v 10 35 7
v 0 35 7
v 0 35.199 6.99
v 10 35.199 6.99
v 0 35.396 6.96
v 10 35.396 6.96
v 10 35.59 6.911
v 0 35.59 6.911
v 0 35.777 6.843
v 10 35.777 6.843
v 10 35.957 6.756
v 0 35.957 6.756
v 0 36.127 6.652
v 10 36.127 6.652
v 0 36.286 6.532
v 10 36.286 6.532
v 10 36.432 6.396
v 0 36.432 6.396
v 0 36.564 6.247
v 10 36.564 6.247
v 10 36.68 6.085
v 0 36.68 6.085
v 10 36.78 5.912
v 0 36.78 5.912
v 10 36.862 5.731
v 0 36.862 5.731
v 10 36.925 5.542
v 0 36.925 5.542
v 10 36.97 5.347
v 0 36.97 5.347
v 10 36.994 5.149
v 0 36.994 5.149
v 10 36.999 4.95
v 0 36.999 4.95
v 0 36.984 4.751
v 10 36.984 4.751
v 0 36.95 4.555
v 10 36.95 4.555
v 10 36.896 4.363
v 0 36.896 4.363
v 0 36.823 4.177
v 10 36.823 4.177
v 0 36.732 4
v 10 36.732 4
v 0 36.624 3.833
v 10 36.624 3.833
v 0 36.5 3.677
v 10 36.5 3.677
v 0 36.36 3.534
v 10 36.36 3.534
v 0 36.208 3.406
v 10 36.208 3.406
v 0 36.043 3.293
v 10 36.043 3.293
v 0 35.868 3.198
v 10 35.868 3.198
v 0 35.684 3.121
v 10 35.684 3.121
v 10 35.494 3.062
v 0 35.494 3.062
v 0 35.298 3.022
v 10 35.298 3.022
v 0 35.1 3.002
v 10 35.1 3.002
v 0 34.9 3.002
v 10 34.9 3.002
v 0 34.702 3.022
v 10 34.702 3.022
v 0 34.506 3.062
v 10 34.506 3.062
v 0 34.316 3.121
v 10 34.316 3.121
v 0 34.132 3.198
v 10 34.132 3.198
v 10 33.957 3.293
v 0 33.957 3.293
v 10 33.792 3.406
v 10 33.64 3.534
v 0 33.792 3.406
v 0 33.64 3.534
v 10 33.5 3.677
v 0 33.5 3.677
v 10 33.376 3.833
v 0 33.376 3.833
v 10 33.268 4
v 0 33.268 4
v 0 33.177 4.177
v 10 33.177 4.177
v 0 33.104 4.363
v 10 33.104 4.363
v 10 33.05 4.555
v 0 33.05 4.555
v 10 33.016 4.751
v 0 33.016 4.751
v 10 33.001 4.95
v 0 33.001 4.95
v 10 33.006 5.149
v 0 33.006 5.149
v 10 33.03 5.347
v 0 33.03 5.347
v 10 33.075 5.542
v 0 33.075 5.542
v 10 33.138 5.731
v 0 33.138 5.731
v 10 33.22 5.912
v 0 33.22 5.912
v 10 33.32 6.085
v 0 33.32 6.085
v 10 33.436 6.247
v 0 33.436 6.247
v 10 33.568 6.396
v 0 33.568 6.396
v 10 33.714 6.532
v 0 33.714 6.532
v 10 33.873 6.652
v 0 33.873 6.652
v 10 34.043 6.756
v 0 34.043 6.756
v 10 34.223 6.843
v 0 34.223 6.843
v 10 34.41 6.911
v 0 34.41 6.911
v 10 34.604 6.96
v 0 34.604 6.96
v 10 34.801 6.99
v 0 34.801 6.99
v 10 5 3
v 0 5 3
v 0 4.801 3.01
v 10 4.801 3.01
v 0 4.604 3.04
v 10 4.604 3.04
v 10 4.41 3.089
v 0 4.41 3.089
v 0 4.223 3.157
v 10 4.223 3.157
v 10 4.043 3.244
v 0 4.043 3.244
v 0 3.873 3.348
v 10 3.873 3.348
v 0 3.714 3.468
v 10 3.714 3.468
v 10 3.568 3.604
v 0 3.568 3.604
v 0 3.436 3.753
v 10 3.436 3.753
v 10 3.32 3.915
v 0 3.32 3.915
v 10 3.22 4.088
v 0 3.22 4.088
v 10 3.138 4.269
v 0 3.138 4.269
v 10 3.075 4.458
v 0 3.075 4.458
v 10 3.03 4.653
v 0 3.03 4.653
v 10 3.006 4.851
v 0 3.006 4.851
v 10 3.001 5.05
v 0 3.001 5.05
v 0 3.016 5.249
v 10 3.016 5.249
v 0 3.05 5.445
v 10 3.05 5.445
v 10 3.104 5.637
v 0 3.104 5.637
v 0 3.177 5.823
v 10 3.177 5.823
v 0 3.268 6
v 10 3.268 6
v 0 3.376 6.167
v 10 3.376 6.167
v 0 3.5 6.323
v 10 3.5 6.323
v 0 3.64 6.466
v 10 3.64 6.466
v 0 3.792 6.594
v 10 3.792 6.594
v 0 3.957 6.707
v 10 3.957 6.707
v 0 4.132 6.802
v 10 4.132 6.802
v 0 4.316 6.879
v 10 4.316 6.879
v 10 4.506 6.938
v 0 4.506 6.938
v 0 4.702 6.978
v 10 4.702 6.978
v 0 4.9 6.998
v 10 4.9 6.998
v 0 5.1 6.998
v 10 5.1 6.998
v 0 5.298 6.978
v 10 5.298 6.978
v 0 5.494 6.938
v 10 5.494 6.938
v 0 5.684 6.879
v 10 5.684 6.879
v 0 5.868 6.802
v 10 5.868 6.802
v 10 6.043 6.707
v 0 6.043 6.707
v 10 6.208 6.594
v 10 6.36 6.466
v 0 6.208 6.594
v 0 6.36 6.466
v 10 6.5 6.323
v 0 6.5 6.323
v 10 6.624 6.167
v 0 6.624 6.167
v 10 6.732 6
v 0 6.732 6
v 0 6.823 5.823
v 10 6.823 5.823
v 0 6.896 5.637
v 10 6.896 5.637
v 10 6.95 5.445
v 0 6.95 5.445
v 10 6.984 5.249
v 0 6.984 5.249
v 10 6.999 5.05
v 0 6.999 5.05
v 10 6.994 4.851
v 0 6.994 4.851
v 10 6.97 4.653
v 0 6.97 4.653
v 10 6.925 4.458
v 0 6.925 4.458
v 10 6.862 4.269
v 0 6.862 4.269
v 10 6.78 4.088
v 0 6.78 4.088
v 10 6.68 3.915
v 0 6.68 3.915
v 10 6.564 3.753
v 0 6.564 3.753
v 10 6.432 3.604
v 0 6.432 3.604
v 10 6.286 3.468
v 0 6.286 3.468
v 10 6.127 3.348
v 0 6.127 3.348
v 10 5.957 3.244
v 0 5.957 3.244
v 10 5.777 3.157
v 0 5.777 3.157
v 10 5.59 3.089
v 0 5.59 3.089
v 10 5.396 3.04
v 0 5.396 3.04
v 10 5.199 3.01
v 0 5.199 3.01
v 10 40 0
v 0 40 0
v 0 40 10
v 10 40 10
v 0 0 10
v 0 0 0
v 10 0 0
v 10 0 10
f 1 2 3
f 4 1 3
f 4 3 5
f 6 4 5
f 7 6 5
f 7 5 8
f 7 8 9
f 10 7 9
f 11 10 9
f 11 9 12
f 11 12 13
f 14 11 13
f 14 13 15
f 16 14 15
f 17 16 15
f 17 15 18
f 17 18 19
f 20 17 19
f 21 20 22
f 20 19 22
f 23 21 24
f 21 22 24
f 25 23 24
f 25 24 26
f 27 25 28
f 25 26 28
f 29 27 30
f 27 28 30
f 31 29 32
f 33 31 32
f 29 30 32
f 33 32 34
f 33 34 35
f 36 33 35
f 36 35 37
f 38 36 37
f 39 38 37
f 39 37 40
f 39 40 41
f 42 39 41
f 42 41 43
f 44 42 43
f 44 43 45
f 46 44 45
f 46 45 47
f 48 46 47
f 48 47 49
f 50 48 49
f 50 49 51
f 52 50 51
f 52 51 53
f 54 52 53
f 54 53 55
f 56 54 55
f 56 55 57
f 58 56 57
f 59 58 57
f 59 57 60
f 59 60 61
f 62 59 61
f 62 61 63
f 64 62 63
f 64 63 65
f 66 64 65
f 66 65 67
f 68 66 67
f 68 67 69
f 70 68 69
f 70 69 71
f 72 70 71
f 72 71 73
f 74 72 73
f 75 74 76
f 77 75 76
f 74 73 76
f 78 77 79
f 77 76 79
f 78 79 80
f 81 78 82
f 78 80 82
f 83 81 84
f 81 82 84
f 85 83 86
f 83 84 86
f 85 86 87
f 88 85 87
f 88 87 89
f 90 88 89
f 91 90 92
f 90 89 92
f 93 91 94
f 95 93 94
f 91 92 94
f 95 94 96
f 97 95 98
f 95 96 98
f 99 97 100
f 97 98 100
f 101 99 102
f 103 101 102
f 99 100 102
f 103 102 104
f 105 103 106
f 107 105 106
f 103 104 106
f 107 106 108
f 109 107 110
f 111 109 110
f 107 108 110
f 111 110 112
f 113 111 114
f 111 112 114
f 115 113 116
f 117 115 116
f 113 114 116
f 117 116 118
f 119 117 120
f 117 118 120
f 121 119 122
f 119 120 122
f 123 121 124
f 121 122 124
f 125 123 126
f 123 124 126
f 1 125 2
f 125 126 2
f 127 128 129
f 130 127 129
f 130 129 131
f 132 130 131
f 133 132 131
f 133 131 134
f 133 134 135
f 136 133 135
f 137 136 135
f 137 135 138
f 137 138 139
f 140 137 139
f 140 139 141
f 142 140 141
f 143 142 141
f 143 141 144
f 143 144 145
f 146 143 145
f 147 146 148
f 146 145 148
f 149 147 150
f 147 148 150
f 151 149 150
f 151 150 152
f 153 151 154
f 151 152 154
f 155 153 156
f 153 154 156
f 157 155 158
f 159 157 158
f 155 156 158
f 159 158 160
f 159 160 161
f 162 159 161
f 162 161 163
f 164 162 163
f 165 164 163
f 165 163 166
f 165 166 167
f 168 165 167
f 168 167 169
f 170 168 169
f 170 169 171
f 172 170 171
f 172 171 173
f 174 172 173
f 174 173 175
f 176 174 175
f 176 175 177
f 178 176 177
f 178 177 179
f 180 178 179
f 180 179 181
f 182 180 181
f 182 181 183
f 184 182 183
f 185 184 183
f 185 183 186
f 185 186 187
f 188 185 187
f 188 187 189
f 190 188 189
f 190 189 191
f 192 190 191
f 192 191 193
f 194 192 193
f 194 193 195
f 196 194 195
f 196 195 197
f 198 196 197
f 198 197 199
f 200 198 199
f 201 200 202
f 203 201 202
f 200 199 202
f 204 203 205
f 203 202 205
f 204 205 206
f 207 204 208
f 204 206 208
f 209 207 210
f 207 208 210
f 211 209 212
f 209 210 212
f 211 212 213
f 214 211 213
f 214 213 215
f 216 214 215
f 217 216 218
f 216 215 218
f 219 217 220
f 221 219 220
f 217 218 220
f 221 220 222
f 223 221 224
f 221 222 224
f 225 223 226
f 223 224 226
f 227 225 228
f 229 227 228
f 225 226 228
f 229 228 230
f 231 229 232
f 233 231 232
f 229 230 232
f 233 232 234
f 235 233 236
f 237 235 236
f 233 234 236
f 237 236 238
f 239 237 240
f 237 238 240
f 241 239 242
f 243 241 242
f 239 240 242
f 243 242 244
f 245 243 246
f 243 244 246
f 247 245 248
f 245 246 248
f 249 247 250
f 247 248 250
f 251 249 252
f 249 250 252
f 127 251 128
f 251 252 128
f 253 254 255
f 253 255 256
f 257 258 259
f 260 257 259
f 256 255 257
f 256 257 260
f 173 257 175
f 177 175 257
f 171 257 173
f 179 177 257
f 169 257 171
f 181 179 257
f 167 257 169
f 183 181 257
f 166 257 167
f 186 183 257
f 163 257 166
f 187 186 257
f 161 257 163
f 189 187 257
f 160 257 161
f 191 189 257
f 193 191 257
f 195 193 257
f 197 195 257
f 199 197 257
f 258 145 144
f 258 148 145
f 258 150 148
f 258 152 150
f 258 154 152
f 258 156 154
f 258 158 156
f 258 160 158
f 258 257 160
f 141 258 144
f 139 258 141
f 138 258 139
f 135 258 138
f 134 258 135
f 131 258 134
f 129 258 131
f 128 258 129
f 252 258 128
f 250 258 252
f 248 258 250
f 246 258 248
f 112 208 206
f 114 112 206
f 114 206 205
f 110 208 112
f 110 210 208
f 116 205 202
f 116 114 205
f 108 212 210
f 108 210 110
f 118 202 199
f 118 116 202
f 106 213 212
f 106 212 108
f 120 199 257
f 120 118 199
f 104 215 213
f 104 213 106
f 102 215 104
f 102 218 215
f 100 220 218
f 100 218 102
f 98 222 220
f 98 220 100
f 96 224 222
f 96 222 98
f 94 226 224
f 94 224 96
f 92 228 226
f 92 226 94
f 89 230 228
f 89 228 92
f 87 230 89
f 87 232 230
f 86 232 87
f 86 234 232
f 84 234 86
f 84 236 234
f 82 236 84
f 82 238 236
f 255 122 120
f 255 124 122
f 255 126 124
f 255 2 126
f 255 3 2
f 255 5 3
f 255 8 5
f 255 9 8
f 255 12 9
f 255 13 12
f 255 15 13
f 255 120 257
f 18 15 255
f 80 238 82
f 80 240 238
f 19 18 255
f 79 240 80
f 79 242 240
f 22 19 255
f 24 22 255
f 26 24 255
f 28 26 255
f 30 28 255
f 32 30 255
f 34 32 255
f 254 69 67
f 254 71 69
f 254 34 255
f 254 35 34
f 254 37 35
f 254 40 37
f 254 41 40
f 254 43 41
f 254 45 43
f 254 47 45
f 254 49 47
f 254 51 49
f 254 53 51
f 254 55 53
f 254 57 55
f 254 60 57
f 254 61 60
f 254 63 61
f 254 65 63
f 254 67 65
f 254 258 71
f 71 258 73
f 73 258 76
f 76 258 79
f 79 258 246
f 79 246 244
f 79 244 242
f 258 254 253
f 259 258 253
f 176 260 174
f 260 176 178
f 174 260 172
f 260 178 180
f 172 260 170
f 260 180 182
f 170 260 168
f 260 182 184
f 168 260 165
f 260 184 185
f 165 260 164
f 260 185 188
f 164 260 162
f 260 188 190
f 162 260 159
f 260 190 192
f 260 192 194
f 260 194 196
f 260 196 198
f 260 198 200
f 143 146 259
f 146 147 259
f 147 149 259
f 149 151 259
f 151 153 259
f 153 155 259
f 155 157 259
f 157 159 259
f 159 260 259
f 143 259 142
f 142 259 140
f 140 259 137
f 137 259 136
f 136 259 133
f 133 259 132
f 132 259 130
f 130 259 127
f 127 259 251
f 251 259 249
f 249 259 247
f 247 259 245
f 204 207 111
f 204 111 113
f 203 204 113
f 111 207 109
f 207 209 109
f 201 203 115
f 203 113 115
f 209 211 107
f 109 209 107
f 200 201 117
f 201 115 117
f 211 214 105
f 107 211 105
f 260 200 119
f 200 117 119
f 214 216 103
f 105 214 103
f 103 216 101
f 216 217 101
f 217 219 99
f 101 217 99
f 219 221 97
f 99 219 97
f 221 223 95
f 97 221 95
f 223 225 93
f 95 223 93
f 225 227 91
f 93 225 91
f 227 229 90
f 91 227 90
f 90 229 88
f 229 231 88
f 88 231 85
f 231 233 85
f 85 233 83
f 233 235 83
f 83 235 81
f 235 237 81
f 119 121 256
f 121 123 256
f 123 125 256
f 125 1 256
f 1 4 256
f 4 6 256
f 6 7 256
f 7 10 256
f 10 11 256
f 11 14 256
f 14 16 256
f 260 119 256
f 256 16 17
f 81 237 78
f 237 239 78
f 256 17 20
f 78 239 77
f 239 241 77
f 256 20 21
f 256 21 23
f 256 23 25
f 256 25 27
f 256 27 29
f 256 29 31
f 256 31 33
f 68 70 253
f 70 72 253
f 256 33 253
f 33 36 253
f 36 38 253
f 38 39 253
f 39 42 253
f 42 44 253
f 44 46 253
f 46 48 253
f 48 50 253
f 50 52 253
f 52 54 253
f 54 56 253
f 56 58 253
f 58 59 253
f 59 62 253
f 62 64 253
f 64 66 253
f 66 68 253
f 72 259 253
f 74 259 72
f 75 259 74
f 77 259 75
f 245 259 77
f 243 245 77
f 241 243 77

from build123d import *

# Parameters (mm, degrees)
SKETCH1_W           = 10
SKETCH1_H           = 40
BOSS_EXTRUDE1_DEPTH = 10
SKETCH3_R           = 2
CUT_EXTRUDE2_DEPTH  = 43.426406871


with BuildPart() as part:
    # Sketch1 → Boss-Extrude1 (new body)
    with BuildSketch(Plane.XY):
        with Locations((5, 20)):
            Rectangle(SKETCH1_W, SKETCH1_H)
    extrude(amount=BOSS_EXTRUDE1_DEPTH)

    # Sketch3 → Cut-Extrude2 (cut, through all)
    with BuildSketch(Plane.ZY):
        with Locations((5, 35)):
            Circle(SKETCH3_R)
        with Locations(Location((5, 5, 0), (0, 0, 180))):
            Circle(SKETCH3_R)
    extrude(amount=-CUT_EXTRUDE2_DEPTH, mode=Mode.SUBTRACT)


solid = part.part
